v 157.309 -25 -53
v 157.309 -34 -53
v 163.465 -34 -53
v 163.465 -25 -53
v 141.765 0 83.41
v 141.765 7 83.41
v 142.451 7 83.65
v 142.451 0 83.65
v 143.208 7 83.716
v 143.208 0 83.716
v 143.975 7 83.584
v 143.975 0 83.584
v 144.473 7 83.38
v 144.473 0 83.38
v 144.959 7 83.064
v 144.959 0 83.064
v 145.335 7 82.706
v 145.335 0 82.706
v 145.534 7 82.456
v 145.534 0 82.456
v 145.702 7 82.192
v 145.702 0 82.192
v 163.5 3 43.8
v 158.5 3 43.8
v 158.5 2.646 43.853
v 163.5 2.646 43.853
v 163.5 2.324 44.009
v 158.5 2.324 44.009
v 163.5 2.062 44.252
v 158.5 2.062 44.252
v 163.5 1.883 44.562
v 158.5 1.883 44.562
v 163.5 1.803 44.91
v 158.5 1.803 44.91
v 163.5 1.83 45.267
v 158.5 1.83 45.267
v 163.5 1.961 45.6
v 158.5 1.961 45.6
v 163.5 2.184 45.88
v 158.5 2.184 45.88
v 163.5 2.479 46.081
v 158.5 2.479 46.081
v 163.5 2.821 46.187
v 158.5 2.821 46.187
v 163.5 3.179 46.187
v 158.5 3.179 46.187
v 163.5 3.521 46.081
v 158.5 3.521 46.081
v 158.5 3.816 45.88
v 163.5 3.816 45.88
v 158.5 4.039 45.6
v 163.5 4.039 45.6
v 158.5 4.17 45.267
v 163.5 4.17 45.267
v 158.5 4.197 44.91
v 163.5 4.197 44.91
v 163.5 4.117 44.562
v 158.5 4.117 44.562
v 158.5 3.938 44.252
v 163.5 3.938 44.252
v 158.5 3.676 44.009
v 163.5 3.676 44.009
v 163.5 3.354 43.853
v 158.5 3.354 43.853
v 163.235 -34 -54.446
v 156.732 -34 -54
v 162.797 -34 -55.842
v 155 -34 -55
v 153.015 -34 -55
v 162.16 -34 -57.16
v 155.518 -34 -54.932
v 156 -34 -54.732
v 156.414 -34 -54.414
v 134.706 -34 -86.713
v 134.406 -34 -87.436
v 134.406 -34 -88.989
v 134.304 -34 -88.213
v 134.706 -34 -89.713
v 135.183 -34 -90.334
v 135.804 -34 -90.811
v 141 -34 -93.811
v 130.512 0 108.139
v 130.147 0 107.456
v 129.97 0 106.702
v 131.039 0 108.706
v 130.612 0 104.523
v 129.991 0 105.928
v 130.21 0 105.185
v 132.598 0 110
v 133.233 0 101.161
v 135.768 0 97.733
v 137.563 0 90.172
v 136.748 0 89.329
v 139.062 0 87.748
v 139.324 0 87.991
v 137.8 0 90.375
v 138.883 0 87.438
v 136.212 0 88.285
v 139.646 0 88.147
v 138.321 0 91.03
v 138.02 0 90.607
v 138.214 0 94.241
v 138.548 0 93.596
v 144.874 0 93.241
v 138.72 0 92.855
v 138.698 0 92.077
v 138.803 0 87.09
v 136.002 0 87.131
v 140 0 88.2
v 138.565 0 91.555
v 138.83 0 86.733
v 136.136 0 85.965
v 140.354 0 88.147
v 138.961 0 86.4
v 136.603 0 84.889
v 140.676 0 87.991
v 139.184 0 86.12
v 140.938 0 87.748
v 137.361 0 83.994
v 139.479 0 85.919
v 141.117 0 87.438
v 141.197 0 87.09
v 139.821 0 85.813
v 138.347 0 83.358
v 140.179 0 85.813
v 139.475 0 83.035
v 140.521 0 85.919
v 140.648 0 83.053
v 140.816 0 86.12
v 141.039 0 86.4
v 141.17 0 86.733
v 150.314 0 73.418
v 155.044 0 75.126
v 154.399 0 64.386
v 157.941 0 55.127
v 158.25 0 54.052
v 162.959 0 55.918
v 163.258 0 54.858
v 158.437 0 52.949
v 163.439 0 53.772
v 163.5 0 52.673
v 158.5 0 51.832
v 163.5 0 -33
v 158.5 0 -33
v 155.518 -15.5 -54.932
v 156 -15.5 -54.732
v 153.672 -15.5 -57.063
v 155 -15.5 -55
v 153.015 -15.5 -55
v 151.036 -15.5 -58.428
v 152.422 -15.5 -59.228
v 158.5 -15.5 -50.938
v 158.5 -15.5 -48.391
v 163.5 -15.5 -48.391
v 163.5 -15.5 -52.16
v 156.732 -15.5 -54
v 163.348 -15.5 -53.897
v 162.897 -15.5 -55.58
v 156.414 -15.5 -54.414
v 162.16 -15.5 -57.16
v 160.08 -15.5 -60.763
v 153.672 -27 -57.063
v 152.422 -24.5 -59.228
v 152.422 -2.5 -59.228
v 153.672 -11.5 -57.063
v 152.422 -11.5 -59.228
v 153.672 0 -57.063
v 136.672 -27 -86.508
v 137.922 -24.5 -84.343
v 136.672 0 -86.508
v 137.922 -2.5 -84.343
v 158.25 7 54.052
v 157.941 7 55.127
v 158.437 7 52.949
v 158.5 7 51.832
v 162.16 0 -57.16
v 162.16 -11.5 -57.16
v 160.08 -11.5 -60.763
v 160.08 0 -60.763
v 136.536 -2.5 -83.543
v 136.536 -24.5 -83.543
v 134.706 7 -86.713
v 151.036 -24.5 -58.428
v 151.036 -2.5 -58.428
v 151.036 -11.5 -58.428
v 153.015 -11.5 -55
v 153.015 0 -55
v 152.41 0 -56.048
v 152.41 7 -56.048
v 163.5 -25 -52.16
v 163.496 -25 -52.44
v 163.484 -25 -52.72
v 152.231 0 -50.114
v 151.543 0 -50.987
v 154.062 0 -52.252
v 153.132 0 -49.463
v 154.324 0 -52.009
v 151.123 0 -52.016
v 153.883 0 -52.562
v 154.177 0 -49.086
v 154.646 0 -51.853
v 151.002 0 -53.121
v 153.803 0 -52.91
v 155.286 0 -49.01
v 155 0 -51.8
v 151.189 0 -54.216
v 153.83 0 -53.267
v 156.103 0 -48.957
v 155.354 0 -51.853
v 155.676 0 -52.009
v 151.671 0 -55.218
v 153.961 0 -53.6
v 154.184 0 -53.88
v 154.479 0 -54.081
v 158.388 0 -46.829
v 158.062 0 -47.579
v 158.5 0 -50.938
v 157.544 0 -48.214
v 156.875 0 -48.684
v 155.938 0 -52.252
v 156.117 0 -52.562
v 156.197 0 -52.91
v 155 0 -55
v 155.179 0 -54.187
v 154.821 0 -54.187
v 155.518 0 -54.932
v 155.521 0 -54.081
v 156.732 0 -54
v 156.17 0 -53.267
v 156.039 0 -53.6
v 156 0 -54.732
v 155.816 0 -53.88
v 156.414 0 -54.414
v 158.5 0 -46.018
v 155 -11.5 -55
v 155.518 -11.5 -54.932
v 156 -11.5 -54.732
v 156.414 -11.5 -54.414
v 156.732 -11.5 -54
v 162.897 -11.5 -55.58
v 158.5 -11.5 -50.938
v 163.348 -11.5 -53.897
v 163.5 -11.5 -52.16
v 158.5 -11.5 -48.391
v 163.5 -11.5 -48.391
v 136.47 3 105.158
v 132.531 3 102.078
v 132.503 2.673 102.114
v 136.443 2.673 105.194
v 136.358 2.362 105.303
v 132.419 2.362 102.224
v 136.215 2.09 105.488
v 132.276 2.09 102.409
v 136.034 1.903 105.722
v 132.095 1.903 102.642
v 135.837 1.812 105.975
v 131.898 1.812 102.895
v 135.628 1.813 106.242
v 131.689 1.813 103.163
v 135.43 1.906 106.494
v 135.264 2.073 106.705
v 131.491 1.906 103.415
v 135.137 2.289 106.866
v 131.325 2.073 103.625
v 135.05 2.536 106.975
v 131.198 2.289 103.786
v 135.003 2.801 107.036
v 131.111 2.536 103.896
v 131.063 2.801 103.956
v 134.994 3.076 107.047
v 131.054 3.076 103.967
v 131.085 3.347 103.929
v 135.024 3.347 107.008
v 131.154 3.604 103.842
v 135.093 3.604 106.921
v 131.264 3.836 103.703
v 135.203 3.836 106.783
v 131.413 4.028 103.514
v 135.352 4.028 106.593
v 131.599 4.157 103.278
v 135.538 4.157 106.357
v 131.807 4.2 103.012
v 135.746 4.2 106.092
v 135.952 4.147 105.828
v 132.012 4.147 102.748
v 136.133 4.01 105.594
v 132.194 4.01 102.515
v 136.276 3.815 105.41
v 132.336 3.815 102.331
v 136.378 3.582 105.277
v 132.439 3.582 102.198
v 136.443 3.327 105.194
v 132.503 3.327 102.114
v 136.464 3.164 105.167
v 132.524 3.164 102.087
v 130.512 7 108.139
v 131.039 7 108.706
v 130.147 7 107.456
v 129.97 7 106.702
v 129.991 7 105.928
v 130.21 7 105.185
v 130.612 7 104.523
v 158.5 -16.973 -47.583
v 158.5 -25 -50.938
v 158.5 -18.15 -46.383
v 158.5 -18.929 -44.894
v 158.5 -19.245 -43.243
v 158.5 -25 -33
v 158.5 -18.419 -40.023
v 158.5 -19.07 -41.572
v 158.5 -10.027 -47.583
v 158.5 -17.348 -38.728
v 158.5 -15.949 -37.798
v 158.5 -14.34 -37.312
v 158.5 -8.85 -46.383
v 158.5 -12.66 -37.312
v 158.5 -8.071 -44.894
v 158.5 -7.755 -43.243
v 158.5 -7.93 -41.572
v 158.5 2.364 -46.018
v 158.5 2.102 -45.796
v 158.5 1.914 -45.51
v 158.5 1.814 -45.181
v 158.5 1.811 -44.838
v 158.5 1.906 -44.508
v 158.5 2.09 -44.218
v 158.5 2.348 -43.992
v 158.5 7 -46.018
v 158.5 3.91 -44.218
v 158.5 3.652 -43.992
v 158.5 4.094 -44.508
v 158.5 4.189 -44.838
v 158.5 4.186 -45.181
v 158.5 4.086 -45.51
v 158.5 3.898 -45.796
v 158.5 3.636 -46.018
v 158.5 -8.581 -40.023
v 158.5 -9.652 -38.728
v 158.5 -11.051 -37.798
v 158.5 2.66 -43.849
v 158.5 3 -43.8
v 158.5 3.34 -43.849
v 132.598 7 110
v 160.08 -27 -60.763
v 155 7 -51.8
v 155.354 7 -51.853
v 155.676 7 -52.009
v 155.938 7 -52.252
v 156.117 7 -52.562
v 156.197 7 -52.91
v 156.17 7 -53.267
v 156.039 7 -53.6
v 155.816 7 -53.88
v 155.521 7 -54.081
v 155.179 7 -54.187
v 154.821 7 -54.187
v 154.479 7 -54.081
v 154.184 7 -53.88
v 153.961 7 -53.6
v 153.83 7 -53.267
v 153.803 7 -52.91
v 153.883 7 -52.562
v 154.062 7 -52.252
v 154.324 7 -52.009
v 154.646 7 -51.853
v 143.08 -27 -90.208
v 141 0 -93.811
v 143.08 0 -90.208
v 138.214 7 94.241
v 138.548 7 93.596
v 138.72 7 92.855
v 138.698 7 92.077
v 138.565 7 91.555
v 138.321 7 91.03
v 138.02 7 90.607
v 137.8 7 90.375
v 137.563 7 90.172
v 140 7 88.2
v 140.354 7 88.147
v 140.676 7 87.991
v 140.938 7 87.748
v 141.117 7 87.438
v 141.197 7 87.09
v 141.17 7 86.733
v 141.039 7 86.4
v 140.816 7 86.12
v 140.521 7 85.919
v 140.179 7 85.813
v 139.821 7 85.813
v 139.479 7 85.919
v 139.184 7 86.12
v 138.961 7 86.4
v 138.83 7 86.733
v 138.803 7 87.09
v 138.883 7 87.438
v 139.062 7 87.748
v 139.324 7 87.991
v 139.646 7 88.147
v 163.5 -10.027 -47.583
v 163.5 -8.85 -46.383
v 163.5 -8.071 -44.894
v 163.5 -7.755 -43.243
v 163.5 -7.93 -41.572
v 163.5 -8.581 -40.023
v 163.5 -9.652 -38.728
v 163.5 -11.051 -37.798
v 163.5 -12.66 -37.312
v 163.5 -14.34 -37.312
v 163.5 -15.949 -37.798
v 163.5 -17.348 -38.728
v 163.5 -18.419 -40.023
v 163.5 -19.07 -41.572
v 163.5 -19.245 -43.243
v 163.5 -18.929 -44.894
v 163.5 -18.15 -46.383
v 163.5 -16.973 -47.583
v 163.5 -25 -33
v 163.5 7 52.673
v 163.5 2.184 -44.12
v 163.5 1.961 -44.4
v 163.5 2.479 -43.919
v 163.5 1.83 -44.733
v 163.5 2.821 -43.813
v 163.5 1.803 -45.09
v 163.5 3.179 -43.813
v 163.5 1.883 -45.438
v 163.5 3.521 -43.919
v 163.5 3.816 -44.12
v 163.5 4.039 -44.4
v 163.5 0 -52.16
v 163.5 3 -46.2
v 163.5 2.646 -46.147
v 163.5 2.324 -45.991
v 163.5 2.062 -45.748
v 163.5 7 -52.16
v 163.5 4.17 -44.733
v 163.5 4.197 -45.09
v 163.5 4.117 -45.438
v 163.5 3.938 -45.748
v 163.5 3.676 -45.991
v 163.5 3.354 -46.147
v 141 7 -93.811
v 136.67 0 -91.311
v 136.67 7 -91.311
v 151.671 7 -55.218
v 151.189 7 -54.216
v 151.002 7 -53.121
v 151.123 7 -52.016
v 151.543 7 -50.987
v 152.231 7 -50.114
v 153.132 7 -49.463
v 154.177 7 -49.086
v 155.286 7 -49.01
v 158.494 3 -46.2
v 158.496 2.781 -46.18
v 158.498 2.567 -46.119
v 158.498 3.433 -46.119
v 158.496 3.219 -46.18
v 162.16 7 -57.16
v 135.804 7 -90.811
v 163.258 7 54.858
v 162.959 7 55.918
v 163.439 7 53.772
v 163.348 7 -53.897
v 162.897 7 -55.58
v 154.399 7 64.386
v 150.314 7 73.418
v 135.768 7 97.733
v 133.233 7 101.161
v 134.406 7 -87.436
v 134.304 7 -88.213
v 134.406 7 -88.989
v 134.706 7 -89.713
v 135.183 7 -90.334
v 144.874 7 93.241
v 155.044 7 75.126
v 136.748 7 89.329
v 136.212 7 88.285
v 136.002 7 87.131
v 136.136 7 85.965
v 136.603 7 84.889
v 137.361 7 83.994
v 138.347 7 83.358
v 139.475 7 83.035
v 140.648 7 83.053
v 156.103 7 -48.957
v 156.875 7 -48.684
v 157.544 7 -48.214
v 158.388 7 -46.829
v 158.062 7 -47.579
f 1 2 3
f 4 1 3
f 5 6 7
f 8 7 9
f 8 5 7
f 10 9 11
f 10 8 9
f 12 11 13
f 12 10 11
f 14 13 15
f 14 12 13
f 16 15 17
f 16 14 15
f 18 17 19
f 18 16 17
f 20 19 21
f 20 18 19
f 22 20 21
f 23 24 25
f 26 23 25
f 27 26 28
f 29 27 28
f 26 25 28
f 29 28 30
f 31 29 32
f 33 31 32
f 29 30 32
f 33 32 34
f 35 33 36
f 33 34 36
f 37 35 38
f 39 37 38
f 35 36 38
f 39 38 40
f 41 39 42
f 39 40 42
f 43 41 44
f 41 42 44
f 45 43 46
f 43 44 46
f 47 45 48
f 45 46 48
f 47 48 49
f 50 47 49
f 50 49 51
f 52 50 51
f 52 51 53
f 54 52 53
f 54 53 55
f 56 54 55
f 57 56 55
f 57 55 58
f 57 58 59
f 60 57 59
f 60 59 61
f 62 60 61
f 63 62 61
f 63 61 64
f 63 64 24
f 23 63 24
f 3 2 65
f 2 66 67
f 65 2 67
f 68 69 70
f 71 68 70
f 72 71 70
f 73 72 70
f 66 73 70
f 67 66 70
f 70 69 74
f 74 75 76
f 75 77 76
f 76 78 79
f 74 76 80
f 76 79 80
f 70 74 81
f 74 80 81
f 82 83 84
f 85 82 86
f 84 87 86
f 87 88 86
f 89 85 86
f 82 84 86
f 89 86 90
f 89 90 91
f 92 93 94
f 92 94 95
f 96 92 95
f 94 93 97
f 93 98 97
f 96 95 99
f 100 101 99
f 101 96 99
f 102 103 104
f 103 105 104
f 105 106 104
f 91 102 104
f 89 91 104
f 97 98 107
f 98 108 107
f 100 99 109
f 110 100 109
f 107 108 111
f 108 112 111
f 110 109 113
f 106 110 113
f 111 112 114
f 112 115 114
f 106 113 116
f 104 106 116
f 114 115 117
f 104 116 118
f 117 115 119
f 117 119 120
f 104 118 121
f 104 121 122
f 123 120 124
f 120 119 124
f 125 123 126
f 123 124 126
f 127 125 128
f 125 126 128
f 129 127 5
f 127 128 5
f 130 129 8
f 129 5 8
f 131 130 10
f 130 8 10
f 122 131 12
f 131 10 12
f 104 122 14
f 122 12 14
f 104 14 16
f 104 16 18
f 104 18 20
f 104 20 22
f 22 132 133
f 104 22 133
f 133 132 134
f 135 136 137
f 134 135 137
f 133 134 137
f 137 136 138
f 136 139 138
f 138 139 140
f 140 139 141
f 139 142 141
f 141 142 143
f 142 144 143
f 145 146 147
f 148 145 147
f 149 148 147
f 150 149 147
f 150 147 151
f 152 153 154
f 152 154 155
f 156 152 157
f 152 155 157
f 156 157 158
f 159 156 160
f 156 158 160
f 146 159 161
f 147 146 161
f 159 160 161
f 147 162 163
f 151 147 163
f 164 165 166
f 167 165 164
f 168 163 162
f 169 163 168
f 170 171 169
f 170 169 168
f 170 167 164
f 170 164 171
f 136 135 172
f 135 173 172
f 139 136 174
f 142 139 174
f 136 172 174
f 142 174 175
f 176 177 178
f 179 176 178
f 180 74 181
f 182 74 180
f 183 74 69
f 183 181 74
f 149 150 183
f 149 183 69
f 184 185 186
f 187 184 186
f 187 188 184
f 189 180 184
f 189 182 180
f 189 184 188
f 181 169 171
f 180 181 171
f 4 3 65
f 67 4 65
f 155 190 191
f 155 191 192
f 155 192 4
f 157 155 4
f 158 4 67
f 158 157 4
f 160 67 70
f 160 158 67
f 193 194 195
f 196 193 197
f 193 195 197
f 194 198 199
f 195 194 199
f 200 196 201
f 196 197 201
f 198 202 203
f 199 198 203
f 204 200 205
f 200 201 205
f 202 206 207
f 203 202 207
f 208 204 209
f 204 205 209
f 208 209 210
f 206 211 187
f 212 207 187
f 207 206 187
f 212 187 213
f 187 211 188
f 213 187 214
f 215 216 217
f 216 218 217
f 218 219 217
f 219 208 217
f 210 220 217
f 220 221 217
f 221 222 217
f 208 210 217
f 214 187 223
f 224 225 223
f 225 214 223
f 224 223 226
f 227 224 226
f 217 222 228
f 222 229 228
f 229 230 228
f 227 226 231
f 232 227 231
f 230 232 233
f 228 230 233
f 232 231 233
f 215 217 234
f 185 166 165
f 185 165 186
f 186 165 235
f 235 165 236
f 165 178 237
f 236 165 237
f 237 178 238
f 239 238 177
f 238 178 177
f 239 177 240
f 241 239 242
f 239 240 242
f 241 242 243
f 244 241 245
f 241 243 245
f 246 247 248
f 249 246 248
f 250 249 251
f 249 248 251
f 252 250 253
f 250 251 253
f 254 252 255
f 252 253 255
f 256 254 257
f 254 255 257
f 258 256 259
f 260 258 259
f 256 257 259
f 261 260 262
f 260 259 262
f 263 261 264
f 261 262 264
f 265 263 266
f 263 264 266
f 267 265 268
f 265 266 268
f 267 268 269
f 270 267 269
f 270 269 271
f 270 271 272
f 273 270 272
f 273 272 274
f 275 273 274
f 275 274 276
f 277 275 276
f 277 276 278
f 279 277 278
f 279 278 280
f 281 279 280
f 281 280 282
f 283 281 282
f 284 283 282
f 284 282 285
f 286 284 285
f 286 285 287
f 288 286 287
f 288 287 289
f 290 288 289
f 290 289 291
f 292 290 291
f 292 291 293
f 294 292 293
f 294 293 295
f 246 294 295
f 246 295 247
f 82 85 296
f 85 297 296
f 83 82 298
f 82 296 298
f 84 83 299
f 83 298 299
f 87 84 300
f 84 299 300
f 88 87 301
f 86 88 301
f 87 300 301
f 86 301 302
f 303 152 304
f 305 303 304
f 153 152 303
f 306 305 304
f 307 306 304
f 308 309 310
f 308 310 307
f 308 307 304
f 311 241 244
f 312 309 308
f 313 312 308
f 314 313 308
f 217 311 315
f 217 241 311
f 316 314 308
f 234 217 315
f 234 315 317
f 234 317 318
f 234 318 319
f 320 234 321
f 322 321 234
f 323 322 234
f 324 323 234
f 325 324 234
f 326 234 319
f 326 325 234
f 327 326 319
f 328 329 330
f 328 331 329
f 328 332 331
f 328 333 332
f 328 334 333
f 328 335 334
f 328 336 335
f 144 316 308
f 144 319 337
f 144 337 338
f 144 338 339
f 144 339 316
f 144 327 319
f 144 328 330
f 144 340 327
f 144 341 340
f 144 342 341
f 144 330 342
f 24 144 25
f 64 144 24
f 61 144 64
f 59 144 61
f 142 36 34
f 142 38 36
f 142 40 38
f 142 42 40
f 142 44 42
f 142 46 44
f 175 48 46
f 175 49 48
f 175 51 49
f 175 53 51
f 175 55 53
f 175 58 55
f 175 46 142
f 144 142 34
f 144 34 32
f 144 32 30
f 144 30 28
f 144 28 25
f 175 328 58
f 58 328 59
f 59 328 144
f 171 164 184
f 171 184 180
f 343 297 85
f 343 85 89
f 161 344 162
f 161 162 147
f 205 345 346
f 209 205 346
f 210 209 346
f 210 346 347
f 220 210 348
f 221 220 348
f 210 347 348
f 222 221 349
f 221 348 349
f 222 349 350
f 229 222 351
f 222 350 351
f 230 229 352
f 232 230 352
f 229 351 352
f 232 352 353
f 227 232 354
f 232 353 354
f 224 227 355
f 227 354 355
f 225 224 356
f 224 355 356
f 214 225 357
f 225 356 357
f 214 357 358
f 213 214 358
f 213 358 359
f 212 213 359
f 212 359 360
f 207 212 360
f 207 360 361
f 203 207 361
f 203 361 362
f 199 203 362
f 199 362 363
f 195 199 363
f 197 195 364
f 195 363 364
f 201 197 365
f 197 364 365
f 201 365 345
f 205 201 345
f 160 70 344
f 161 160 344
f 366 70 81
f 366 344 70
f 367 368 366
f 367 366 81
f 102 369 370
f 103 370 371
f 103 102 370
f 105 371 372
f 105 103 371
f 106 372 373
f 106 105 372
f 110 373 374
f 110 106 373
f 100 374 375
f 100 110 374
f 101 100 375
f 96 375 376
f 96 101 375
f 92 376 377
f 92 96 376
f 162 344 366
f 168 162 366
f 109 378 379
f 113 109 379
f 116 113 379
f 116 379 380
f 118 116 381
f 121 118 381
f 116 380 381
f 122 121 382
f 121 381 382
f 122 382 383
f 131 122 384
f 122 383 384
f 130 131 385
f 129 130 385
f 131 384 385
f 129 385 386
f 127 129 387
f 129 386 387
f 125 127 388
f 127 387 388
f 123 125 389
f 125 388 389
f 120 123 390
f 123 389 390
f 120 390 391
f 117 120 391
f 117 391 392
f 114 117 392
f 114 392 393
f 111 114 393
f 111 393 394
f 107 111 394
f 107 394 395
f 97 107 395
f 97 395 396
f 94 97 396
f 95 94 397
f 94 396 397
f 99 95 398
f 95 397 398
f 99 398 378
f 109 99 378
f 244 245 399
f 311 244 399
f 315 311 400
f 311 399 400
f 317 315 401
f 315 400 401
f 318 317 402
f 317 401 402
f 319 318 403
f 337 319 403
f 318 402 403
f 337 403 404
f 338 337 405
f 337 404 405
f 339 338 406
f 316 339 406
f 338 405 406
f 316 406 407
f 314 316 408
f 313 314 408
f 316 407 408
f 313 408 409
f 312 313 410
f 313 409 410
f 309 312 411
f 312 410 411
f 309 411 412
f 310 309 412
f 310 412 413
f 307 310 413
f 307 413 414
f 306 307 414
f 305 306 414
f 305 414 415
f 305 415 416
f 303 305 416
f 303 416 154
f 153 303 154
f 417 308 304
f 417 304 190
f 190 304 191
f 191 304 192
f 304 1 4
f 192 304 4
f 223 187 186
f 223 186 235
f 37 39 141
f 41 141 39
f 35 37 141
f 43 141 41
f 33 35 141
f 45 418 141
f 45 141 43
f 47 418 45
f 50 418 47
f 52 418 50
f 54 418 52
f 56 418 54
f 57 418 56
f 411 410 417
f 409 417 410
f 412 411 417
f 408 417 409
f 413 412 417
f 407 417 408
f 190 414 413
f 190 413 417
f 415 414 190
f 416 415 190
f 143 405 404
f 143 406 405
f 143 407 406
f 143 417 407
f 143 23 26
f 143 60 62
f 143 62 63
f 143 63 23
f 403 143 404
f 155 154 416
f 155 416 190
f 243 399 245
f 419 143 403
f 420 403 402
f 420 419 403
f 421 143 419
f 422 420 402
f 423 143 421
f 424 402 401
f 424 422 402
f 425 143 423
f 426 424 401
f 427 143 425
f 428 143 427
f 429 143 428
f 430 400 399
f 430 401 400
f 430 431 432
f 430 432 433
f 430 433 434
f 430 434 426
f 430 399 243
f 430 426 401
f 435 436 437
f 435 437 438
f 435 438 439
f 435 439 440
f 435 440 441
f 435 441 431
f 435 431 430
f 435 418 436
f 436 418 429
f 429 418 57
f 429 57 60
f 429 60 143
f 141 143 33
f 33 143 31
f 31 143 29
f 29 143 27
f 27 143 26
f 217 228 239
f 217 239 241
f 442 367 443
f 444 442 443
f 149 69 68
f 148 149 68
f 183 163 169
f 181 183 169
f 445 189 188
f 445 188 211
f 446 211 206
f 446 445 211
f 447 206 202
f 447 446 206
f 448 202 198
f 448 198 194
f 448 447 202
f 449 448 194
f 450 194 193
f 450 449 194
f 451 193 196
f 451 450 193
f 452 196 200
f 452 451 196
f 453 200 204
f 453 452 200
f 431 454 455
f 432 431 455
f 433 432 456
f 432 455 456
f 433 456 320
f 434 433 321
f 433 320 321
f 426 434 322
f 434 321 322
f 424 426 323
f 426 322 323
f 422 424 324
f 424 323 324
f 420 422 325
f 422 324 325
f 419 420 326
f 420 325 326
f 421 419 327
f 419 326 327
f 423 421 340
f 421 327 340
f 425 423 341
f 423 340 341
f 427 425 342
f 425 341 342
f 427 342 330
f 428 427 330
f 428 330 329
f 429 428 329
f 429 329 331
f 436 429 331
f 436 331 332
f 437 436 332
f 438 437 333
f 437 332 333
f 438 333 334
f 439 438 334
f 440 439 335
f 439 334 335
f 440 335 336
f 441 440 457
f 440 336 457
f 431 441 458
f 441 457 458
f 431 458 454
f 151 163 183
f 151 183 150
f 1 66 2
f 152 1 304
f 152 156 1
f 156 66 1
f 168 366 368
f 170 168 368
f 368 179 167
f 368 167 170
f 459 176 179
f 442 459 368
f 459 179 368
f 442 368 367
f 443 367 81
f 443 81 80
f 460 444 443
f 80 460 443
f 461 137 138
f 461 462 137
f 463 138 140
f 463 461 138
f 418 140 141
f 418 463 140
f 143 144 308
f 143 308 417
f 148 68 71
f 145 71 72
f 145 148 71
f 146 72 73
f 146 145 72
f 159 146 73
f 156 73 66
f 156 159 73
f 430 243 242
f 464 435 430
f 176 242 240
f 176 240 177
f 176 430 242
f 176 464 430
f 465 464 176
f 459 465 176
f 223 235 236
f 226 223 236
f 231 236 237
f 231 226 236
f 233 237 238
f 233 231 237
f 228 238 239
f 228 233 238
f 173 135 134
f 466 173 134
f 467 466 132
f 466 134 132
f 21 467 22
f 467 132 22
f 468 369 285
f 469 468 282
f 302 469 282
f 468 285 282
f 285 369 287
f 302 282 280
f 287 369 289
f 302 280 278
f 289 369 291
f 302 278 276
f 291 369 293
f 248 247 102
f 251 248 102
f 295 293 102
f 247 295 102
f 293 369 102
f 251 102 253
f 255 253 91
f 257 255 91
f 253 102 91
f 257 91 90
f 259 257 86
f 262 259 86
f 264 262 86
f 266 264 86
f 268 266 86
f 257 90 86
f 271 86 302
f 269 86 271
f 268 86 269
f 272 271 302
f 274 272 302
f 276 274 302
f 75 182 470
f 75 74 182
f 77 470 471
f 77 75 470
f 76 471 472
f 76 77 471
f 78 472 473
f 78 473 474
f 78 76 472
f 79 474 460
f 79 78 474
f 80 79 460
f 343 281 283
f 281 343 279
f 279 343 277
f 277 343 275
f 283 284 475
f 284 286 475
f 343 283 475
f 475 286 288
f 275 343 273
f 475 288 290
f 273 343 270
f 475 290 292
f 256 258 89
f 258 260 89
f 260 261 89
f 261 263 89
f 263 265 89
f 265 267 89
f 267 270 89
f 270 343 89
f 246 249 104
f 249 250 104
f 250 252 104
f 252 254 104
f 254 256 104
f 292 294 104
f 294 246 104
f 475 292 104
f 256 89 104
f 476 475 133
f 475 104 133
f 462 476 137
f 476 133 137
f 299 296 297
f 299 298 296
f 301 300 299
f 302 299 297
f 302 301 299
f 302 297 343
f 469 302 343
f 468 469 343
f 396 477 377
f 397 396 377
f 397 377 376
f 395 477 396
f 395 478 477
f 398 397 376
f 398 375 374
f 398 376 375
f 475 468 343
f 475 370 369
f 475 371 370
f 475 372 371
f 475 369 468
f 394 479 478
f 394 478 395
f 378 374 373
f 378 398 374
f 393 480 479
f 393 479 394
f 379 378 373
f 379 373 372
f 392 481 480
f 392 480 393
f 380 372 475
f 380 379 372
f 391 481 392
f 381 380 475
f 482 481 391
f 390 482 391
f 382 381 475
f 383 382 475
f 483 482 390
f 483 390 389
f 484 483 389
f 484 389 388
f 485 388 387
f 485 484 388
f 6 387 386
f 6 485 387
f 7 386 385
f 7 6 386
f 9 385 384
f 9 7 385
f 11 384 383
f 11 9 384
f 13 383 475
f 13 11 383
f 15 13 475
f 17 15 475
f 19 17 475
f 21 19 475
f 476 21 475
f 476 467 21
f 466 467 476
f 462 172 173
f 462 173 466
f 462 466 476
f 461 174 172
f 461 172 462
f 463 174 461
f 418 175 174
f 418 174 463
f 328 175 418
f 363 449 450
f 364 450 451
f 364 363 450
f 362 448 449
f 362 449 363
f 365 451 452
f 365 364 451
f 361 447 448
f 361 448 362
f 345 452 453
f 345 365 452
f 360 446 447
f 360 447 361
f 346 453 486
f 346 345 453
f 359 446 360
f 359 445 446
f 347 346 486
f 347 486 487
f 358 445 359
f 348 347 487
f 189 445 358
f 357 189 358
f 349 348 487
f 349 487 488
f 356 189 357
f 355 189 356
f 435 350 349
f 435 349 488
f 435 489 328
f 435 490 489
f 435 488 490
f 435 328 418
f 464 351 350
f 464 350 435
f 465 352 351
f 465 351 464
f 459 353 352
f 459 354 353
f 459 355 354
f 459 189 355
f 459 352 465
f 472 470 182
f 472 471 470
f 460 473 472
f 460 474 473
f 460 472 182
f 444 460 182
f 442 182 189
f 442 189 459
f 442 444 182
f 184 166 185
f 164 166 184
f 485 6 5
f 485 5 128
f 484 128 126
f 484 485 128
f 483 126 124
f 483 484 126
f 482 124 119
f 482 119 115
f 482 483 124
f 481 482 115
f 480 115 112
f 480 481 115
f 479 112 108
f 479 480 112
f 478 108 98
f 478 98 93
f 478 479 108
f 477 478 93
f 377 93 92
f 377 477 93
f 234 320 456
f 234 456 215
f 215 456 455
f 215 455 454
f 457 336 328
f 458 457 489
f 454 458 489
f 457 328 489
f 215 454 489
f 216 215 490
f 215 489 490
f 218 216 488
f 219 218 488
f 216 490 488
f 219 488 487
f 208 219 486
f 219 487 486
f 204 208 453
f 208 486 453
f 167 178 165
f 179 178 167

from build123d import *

# Parameters (mm, degrees)
BOSS_EXTRU_1_DEPTH                      = 7
ESQUISSE2_R                             = 4
ESQUISSE2_R_2                           = 1.2
BOSS_EXTRU_2_DEPTH                      = 7
CONG_1_R                                = 10
CONG_2_R                                = 3
BOSS_EXTRU_3_DEPTH                      = 41
ESQUISSE5_W                             = 29
ESQUISSE5_H                             = 22
ENL_V_MAT_EXTRU_1_DEPTH                 = 199.198296894
ESQUISSE7_W                             = 34
ESQUISSE7_H                             = 27
ENL_V_MAT_EXTRU_2_DEPTH                 = 7.4
ENL_V_START                             = -32
ESQUISSE8_W                             = 163.5
ESQUISSE8_H                             = 53
ENL_V_MAT_EXTRU_3_DEPTH                 = 170.279035308
ENL_V_MAT_EXTRU_4_DEPTH                 = 120.922123014
CONG_3_R                                = 3
DIAM_TRE_DU_PER_AGE_2_4_2_4_1_D         = 2.4
DIAM_TRE_DU_PER_AGE_2_4_2_4_1_ON_FACE_D = 2.4


with BuildPart() as part:
    # Esquisse1 → Boss.-Extru.1 (new body)
    with BuildSketch(Plane(origin=(0, 0, 0), x_dir=(1, 0, 0), z_dir=(0, 1, 0))):
        with BuildLine():
            Line((163.5, -54.314885969), (163.5, 54.839745962))
            Line((163.5, 54.839745962), (141, 93.810889132))
            Line((141, 93.810889132), (136.669872981, 91.310889132))
            Line((136.669872981, 91.310889132), (158.5, 53.5))
            Line((158.5, 53.5), (158.5, -53.5))
            ThreePointArc((158.5, -53.5), (146.077391865, -81.52236249), (128.750264504, -106.807627959))
            Line((128.750264504, -106.807627959), (132.598479772, -110))
            ThreePointArc((132.598479772, -110), (150.644566487, -83.59767596), (163.5, -54.314885969))
        make_face()
    extrude(amount=BOSS_EXTRU_1_DEPTH)

    # Esquisse2 → Boss.-Extru.2 (add)
    # profile 1 of 2: a face of its own
    with BuildSketch(Plane(origin=(0, 7, 0), x_dir=(1, 0, 0), z_dir=(0, 1, 0))):
        with Locations((155, 53)):
            Circle(ESQUISSE2_R)
        with Locations(Location((155, 53, 0), (0, 0, 270))):
            Circle(ESQUISSE2_R_2, mode=Mode.SUBTRACT)
    # profile 2 of 2: a face of its own
    with BuildSketch(Plane(origin=(0, 7, 0), x_dir=(1, 0, 0), z_dir=(0, 1, 0))):
        with Locations((140, -87)):
            Circle(ESQUISSE2_R)
        with Locations(Location((140, -87, 0), (0, 0, 270))):
            Circle(ESQUISSE2_R_2, mode=Mode.SUBTRACT)
    extrude(amount=-BOSS_EXTRU_2_DEPTH)

    # Congé1
    cong_1_edges = [part.edges().sort_by_distance(p)[0] for p in [
        (158.5, 3.5, 53.5),
        (163.5, 3.5, -54.839745962),
        (163.5, 3.5, 54.314885969),
    ]]
    fillet(cong_1_edges, radius=CONG_1_R)

    # Congé2
    cong_2_edges = [part.edges().sort_by_distance(p)[0] for p in [
        (128.750264504, 3.5, 106.807627959),
        (156.697559724, 3.5, -56.621918136),
        (158.5, 3.5, -51.063508327),
        (140.380940937, 3.5, 90.981819183),
        (143.738827918, 3.5, 85.578322891),
    ]]
    fillet(cong_2_edges, radius=CONG_2_R)

    # Esquisse4 → Boss.-Extru.3 (add)
    with BuildSketch(Plane(origin=(0, 7, 0), x_dir=(1, 0, 0), z_dir=(0, 1, 0))):
        with BuildLine():
            Line((162.160254038, 57.160254038), (141, 93.810889132))
            Line((141, 93.810889132), (133.205771366, 89.310889132))
            Line((133.205771366, 89.310889132), (153.015172443, 55))
            Line((153.015172443, 55), (155, 55))
            ThreePointArc((155, 55), (156, 54.732050808), (156.732050808, 54))
            Line((156.732050808, 54), (158.5, 50.937822174))
            Line((158.5, 50.937822174), (158.5, 33))
            Line((158.5, 33), (163.5, 33))
            Line((163.5, 33), (163.5, 52.160254038))
            ThreePointArc((163.5, 52.160254038), (163.159258263, 54.748444489), (162.160254038, 57.160254038))
        make_face()
    extrude(amount=-BOSS_EXTRU_3_DEPTH)

    # Esquisse5 → Enlèv. mat.-Extru.1 (cut, through all)
    with BuildSketch(Plane(origin=(146.37130657, 0, -84.50751325), x_dir=(-0.4999999999999999, 0, -0.8660254037844387), z_dir=(0.8660254037844387, 0, -0.4999999999999999))):
        with Locations((-10.417640898, -13.5)):
            Rectangle(ESQUISSE5_W, ESQUISSE5_H)
    extrude(amount=-ENL_V_MAT_EXTRU_1_DEPTH, mode=Mode.SUBTRACT)

    # Esquisse7 → Enlèv. mat.-Extru.2 (cut)
    with BuildSketch(Plane(origin=(146.37130657, 0, -84.50751325), x_dir=(-0.4999999999999999, 0, -0.8660254037844387), z_dir=(0.8660254037844387, 0, -0.4999999999999999))):
        with Locations((-10.417640898, -13.5)):
            Rectangle(ESQUISSE7_W, ESQUISSE7_H)
    extrude(amount=-ENL_V_MAT_EXTRU_2_DEPTH, mode=Mode.SUBTRACT)

    # Esquisse8 → Enlèv. mat.-Extru.3 (cut, through all)
    with BuildSketch(Plane(origin=(0, 7, 0), x_dir=(1, 0, 0), z_dir=(0, 1, 0)).offset(ENL_V_START)):
        with Locations((81.75, 26.5)):
            Rectangle(ESQUISSE8_W, ESQUISSE8_H)
    extrude(amount=-ENL_V_MAT_EXTRU_3_DEPTH, mode=Mode.SUBTRACT)

    # Esquisse9 → Enlèv. mat.-Extru.4 (cut, through all)
    with BuildSketch(Plane(origin=(163.5, 0, 0), x_dir=(0, 0, -1), z_dir=(1, 0, 0))):
        with BuildLine():
            Line((60.763139721, -11.5), (48.390964663, -11.5))
            ThreePointArc((48.390964663, -11.5), (37.25, -13.5), (48.390964663, -15.5))
            Line((48.390964663, -15.5), (60.763139721, -15.5))
            Line((60.763139721, -15.5), (60.763139721, -11.5))
        make_face()
    extrude(amount=-ENL_V_MAT_EXTRU_4_DEPTH, mode=Mode.SUBTRACT)

    # Congé3
    cong_3_edges = [part.edges().sort_by_distance(p)[0] for p in [
        (133.205771366, -13.5, -89.310889132),
    ]]
    fillet(cong_3_edges, radius=CONG_3_R)

    # Diamètre du perçage Ø2.4 (2.4)1 (through all)
    with Locations(Plane(origin=(135.734675085, 3, 106.105866084), x_dir=(-0.615871636874, 0, 0.787846512269), z_dir=(0.787846512269, 0, 0.615871636874))):
        with Locations((0, 0)):
            Hole(DIAM_TRE_DU_PER_AGE_2_4_2_4_1_D / 2)

    # Diamètre du perçage Ø2.4 (2.4)1 on face (through all)
    with Locations(Plane(origin=(163.5, 3, -45), x_dir=(0, 0, 1), z_dir=(1, 0, 0))):
        with Locations((0, 0), (90, 0)):
            Hole(DIAM_TRE_DU_PER_AGE_2_4_2_4_1_ON_FACE_D / 2)


solid = part.part
